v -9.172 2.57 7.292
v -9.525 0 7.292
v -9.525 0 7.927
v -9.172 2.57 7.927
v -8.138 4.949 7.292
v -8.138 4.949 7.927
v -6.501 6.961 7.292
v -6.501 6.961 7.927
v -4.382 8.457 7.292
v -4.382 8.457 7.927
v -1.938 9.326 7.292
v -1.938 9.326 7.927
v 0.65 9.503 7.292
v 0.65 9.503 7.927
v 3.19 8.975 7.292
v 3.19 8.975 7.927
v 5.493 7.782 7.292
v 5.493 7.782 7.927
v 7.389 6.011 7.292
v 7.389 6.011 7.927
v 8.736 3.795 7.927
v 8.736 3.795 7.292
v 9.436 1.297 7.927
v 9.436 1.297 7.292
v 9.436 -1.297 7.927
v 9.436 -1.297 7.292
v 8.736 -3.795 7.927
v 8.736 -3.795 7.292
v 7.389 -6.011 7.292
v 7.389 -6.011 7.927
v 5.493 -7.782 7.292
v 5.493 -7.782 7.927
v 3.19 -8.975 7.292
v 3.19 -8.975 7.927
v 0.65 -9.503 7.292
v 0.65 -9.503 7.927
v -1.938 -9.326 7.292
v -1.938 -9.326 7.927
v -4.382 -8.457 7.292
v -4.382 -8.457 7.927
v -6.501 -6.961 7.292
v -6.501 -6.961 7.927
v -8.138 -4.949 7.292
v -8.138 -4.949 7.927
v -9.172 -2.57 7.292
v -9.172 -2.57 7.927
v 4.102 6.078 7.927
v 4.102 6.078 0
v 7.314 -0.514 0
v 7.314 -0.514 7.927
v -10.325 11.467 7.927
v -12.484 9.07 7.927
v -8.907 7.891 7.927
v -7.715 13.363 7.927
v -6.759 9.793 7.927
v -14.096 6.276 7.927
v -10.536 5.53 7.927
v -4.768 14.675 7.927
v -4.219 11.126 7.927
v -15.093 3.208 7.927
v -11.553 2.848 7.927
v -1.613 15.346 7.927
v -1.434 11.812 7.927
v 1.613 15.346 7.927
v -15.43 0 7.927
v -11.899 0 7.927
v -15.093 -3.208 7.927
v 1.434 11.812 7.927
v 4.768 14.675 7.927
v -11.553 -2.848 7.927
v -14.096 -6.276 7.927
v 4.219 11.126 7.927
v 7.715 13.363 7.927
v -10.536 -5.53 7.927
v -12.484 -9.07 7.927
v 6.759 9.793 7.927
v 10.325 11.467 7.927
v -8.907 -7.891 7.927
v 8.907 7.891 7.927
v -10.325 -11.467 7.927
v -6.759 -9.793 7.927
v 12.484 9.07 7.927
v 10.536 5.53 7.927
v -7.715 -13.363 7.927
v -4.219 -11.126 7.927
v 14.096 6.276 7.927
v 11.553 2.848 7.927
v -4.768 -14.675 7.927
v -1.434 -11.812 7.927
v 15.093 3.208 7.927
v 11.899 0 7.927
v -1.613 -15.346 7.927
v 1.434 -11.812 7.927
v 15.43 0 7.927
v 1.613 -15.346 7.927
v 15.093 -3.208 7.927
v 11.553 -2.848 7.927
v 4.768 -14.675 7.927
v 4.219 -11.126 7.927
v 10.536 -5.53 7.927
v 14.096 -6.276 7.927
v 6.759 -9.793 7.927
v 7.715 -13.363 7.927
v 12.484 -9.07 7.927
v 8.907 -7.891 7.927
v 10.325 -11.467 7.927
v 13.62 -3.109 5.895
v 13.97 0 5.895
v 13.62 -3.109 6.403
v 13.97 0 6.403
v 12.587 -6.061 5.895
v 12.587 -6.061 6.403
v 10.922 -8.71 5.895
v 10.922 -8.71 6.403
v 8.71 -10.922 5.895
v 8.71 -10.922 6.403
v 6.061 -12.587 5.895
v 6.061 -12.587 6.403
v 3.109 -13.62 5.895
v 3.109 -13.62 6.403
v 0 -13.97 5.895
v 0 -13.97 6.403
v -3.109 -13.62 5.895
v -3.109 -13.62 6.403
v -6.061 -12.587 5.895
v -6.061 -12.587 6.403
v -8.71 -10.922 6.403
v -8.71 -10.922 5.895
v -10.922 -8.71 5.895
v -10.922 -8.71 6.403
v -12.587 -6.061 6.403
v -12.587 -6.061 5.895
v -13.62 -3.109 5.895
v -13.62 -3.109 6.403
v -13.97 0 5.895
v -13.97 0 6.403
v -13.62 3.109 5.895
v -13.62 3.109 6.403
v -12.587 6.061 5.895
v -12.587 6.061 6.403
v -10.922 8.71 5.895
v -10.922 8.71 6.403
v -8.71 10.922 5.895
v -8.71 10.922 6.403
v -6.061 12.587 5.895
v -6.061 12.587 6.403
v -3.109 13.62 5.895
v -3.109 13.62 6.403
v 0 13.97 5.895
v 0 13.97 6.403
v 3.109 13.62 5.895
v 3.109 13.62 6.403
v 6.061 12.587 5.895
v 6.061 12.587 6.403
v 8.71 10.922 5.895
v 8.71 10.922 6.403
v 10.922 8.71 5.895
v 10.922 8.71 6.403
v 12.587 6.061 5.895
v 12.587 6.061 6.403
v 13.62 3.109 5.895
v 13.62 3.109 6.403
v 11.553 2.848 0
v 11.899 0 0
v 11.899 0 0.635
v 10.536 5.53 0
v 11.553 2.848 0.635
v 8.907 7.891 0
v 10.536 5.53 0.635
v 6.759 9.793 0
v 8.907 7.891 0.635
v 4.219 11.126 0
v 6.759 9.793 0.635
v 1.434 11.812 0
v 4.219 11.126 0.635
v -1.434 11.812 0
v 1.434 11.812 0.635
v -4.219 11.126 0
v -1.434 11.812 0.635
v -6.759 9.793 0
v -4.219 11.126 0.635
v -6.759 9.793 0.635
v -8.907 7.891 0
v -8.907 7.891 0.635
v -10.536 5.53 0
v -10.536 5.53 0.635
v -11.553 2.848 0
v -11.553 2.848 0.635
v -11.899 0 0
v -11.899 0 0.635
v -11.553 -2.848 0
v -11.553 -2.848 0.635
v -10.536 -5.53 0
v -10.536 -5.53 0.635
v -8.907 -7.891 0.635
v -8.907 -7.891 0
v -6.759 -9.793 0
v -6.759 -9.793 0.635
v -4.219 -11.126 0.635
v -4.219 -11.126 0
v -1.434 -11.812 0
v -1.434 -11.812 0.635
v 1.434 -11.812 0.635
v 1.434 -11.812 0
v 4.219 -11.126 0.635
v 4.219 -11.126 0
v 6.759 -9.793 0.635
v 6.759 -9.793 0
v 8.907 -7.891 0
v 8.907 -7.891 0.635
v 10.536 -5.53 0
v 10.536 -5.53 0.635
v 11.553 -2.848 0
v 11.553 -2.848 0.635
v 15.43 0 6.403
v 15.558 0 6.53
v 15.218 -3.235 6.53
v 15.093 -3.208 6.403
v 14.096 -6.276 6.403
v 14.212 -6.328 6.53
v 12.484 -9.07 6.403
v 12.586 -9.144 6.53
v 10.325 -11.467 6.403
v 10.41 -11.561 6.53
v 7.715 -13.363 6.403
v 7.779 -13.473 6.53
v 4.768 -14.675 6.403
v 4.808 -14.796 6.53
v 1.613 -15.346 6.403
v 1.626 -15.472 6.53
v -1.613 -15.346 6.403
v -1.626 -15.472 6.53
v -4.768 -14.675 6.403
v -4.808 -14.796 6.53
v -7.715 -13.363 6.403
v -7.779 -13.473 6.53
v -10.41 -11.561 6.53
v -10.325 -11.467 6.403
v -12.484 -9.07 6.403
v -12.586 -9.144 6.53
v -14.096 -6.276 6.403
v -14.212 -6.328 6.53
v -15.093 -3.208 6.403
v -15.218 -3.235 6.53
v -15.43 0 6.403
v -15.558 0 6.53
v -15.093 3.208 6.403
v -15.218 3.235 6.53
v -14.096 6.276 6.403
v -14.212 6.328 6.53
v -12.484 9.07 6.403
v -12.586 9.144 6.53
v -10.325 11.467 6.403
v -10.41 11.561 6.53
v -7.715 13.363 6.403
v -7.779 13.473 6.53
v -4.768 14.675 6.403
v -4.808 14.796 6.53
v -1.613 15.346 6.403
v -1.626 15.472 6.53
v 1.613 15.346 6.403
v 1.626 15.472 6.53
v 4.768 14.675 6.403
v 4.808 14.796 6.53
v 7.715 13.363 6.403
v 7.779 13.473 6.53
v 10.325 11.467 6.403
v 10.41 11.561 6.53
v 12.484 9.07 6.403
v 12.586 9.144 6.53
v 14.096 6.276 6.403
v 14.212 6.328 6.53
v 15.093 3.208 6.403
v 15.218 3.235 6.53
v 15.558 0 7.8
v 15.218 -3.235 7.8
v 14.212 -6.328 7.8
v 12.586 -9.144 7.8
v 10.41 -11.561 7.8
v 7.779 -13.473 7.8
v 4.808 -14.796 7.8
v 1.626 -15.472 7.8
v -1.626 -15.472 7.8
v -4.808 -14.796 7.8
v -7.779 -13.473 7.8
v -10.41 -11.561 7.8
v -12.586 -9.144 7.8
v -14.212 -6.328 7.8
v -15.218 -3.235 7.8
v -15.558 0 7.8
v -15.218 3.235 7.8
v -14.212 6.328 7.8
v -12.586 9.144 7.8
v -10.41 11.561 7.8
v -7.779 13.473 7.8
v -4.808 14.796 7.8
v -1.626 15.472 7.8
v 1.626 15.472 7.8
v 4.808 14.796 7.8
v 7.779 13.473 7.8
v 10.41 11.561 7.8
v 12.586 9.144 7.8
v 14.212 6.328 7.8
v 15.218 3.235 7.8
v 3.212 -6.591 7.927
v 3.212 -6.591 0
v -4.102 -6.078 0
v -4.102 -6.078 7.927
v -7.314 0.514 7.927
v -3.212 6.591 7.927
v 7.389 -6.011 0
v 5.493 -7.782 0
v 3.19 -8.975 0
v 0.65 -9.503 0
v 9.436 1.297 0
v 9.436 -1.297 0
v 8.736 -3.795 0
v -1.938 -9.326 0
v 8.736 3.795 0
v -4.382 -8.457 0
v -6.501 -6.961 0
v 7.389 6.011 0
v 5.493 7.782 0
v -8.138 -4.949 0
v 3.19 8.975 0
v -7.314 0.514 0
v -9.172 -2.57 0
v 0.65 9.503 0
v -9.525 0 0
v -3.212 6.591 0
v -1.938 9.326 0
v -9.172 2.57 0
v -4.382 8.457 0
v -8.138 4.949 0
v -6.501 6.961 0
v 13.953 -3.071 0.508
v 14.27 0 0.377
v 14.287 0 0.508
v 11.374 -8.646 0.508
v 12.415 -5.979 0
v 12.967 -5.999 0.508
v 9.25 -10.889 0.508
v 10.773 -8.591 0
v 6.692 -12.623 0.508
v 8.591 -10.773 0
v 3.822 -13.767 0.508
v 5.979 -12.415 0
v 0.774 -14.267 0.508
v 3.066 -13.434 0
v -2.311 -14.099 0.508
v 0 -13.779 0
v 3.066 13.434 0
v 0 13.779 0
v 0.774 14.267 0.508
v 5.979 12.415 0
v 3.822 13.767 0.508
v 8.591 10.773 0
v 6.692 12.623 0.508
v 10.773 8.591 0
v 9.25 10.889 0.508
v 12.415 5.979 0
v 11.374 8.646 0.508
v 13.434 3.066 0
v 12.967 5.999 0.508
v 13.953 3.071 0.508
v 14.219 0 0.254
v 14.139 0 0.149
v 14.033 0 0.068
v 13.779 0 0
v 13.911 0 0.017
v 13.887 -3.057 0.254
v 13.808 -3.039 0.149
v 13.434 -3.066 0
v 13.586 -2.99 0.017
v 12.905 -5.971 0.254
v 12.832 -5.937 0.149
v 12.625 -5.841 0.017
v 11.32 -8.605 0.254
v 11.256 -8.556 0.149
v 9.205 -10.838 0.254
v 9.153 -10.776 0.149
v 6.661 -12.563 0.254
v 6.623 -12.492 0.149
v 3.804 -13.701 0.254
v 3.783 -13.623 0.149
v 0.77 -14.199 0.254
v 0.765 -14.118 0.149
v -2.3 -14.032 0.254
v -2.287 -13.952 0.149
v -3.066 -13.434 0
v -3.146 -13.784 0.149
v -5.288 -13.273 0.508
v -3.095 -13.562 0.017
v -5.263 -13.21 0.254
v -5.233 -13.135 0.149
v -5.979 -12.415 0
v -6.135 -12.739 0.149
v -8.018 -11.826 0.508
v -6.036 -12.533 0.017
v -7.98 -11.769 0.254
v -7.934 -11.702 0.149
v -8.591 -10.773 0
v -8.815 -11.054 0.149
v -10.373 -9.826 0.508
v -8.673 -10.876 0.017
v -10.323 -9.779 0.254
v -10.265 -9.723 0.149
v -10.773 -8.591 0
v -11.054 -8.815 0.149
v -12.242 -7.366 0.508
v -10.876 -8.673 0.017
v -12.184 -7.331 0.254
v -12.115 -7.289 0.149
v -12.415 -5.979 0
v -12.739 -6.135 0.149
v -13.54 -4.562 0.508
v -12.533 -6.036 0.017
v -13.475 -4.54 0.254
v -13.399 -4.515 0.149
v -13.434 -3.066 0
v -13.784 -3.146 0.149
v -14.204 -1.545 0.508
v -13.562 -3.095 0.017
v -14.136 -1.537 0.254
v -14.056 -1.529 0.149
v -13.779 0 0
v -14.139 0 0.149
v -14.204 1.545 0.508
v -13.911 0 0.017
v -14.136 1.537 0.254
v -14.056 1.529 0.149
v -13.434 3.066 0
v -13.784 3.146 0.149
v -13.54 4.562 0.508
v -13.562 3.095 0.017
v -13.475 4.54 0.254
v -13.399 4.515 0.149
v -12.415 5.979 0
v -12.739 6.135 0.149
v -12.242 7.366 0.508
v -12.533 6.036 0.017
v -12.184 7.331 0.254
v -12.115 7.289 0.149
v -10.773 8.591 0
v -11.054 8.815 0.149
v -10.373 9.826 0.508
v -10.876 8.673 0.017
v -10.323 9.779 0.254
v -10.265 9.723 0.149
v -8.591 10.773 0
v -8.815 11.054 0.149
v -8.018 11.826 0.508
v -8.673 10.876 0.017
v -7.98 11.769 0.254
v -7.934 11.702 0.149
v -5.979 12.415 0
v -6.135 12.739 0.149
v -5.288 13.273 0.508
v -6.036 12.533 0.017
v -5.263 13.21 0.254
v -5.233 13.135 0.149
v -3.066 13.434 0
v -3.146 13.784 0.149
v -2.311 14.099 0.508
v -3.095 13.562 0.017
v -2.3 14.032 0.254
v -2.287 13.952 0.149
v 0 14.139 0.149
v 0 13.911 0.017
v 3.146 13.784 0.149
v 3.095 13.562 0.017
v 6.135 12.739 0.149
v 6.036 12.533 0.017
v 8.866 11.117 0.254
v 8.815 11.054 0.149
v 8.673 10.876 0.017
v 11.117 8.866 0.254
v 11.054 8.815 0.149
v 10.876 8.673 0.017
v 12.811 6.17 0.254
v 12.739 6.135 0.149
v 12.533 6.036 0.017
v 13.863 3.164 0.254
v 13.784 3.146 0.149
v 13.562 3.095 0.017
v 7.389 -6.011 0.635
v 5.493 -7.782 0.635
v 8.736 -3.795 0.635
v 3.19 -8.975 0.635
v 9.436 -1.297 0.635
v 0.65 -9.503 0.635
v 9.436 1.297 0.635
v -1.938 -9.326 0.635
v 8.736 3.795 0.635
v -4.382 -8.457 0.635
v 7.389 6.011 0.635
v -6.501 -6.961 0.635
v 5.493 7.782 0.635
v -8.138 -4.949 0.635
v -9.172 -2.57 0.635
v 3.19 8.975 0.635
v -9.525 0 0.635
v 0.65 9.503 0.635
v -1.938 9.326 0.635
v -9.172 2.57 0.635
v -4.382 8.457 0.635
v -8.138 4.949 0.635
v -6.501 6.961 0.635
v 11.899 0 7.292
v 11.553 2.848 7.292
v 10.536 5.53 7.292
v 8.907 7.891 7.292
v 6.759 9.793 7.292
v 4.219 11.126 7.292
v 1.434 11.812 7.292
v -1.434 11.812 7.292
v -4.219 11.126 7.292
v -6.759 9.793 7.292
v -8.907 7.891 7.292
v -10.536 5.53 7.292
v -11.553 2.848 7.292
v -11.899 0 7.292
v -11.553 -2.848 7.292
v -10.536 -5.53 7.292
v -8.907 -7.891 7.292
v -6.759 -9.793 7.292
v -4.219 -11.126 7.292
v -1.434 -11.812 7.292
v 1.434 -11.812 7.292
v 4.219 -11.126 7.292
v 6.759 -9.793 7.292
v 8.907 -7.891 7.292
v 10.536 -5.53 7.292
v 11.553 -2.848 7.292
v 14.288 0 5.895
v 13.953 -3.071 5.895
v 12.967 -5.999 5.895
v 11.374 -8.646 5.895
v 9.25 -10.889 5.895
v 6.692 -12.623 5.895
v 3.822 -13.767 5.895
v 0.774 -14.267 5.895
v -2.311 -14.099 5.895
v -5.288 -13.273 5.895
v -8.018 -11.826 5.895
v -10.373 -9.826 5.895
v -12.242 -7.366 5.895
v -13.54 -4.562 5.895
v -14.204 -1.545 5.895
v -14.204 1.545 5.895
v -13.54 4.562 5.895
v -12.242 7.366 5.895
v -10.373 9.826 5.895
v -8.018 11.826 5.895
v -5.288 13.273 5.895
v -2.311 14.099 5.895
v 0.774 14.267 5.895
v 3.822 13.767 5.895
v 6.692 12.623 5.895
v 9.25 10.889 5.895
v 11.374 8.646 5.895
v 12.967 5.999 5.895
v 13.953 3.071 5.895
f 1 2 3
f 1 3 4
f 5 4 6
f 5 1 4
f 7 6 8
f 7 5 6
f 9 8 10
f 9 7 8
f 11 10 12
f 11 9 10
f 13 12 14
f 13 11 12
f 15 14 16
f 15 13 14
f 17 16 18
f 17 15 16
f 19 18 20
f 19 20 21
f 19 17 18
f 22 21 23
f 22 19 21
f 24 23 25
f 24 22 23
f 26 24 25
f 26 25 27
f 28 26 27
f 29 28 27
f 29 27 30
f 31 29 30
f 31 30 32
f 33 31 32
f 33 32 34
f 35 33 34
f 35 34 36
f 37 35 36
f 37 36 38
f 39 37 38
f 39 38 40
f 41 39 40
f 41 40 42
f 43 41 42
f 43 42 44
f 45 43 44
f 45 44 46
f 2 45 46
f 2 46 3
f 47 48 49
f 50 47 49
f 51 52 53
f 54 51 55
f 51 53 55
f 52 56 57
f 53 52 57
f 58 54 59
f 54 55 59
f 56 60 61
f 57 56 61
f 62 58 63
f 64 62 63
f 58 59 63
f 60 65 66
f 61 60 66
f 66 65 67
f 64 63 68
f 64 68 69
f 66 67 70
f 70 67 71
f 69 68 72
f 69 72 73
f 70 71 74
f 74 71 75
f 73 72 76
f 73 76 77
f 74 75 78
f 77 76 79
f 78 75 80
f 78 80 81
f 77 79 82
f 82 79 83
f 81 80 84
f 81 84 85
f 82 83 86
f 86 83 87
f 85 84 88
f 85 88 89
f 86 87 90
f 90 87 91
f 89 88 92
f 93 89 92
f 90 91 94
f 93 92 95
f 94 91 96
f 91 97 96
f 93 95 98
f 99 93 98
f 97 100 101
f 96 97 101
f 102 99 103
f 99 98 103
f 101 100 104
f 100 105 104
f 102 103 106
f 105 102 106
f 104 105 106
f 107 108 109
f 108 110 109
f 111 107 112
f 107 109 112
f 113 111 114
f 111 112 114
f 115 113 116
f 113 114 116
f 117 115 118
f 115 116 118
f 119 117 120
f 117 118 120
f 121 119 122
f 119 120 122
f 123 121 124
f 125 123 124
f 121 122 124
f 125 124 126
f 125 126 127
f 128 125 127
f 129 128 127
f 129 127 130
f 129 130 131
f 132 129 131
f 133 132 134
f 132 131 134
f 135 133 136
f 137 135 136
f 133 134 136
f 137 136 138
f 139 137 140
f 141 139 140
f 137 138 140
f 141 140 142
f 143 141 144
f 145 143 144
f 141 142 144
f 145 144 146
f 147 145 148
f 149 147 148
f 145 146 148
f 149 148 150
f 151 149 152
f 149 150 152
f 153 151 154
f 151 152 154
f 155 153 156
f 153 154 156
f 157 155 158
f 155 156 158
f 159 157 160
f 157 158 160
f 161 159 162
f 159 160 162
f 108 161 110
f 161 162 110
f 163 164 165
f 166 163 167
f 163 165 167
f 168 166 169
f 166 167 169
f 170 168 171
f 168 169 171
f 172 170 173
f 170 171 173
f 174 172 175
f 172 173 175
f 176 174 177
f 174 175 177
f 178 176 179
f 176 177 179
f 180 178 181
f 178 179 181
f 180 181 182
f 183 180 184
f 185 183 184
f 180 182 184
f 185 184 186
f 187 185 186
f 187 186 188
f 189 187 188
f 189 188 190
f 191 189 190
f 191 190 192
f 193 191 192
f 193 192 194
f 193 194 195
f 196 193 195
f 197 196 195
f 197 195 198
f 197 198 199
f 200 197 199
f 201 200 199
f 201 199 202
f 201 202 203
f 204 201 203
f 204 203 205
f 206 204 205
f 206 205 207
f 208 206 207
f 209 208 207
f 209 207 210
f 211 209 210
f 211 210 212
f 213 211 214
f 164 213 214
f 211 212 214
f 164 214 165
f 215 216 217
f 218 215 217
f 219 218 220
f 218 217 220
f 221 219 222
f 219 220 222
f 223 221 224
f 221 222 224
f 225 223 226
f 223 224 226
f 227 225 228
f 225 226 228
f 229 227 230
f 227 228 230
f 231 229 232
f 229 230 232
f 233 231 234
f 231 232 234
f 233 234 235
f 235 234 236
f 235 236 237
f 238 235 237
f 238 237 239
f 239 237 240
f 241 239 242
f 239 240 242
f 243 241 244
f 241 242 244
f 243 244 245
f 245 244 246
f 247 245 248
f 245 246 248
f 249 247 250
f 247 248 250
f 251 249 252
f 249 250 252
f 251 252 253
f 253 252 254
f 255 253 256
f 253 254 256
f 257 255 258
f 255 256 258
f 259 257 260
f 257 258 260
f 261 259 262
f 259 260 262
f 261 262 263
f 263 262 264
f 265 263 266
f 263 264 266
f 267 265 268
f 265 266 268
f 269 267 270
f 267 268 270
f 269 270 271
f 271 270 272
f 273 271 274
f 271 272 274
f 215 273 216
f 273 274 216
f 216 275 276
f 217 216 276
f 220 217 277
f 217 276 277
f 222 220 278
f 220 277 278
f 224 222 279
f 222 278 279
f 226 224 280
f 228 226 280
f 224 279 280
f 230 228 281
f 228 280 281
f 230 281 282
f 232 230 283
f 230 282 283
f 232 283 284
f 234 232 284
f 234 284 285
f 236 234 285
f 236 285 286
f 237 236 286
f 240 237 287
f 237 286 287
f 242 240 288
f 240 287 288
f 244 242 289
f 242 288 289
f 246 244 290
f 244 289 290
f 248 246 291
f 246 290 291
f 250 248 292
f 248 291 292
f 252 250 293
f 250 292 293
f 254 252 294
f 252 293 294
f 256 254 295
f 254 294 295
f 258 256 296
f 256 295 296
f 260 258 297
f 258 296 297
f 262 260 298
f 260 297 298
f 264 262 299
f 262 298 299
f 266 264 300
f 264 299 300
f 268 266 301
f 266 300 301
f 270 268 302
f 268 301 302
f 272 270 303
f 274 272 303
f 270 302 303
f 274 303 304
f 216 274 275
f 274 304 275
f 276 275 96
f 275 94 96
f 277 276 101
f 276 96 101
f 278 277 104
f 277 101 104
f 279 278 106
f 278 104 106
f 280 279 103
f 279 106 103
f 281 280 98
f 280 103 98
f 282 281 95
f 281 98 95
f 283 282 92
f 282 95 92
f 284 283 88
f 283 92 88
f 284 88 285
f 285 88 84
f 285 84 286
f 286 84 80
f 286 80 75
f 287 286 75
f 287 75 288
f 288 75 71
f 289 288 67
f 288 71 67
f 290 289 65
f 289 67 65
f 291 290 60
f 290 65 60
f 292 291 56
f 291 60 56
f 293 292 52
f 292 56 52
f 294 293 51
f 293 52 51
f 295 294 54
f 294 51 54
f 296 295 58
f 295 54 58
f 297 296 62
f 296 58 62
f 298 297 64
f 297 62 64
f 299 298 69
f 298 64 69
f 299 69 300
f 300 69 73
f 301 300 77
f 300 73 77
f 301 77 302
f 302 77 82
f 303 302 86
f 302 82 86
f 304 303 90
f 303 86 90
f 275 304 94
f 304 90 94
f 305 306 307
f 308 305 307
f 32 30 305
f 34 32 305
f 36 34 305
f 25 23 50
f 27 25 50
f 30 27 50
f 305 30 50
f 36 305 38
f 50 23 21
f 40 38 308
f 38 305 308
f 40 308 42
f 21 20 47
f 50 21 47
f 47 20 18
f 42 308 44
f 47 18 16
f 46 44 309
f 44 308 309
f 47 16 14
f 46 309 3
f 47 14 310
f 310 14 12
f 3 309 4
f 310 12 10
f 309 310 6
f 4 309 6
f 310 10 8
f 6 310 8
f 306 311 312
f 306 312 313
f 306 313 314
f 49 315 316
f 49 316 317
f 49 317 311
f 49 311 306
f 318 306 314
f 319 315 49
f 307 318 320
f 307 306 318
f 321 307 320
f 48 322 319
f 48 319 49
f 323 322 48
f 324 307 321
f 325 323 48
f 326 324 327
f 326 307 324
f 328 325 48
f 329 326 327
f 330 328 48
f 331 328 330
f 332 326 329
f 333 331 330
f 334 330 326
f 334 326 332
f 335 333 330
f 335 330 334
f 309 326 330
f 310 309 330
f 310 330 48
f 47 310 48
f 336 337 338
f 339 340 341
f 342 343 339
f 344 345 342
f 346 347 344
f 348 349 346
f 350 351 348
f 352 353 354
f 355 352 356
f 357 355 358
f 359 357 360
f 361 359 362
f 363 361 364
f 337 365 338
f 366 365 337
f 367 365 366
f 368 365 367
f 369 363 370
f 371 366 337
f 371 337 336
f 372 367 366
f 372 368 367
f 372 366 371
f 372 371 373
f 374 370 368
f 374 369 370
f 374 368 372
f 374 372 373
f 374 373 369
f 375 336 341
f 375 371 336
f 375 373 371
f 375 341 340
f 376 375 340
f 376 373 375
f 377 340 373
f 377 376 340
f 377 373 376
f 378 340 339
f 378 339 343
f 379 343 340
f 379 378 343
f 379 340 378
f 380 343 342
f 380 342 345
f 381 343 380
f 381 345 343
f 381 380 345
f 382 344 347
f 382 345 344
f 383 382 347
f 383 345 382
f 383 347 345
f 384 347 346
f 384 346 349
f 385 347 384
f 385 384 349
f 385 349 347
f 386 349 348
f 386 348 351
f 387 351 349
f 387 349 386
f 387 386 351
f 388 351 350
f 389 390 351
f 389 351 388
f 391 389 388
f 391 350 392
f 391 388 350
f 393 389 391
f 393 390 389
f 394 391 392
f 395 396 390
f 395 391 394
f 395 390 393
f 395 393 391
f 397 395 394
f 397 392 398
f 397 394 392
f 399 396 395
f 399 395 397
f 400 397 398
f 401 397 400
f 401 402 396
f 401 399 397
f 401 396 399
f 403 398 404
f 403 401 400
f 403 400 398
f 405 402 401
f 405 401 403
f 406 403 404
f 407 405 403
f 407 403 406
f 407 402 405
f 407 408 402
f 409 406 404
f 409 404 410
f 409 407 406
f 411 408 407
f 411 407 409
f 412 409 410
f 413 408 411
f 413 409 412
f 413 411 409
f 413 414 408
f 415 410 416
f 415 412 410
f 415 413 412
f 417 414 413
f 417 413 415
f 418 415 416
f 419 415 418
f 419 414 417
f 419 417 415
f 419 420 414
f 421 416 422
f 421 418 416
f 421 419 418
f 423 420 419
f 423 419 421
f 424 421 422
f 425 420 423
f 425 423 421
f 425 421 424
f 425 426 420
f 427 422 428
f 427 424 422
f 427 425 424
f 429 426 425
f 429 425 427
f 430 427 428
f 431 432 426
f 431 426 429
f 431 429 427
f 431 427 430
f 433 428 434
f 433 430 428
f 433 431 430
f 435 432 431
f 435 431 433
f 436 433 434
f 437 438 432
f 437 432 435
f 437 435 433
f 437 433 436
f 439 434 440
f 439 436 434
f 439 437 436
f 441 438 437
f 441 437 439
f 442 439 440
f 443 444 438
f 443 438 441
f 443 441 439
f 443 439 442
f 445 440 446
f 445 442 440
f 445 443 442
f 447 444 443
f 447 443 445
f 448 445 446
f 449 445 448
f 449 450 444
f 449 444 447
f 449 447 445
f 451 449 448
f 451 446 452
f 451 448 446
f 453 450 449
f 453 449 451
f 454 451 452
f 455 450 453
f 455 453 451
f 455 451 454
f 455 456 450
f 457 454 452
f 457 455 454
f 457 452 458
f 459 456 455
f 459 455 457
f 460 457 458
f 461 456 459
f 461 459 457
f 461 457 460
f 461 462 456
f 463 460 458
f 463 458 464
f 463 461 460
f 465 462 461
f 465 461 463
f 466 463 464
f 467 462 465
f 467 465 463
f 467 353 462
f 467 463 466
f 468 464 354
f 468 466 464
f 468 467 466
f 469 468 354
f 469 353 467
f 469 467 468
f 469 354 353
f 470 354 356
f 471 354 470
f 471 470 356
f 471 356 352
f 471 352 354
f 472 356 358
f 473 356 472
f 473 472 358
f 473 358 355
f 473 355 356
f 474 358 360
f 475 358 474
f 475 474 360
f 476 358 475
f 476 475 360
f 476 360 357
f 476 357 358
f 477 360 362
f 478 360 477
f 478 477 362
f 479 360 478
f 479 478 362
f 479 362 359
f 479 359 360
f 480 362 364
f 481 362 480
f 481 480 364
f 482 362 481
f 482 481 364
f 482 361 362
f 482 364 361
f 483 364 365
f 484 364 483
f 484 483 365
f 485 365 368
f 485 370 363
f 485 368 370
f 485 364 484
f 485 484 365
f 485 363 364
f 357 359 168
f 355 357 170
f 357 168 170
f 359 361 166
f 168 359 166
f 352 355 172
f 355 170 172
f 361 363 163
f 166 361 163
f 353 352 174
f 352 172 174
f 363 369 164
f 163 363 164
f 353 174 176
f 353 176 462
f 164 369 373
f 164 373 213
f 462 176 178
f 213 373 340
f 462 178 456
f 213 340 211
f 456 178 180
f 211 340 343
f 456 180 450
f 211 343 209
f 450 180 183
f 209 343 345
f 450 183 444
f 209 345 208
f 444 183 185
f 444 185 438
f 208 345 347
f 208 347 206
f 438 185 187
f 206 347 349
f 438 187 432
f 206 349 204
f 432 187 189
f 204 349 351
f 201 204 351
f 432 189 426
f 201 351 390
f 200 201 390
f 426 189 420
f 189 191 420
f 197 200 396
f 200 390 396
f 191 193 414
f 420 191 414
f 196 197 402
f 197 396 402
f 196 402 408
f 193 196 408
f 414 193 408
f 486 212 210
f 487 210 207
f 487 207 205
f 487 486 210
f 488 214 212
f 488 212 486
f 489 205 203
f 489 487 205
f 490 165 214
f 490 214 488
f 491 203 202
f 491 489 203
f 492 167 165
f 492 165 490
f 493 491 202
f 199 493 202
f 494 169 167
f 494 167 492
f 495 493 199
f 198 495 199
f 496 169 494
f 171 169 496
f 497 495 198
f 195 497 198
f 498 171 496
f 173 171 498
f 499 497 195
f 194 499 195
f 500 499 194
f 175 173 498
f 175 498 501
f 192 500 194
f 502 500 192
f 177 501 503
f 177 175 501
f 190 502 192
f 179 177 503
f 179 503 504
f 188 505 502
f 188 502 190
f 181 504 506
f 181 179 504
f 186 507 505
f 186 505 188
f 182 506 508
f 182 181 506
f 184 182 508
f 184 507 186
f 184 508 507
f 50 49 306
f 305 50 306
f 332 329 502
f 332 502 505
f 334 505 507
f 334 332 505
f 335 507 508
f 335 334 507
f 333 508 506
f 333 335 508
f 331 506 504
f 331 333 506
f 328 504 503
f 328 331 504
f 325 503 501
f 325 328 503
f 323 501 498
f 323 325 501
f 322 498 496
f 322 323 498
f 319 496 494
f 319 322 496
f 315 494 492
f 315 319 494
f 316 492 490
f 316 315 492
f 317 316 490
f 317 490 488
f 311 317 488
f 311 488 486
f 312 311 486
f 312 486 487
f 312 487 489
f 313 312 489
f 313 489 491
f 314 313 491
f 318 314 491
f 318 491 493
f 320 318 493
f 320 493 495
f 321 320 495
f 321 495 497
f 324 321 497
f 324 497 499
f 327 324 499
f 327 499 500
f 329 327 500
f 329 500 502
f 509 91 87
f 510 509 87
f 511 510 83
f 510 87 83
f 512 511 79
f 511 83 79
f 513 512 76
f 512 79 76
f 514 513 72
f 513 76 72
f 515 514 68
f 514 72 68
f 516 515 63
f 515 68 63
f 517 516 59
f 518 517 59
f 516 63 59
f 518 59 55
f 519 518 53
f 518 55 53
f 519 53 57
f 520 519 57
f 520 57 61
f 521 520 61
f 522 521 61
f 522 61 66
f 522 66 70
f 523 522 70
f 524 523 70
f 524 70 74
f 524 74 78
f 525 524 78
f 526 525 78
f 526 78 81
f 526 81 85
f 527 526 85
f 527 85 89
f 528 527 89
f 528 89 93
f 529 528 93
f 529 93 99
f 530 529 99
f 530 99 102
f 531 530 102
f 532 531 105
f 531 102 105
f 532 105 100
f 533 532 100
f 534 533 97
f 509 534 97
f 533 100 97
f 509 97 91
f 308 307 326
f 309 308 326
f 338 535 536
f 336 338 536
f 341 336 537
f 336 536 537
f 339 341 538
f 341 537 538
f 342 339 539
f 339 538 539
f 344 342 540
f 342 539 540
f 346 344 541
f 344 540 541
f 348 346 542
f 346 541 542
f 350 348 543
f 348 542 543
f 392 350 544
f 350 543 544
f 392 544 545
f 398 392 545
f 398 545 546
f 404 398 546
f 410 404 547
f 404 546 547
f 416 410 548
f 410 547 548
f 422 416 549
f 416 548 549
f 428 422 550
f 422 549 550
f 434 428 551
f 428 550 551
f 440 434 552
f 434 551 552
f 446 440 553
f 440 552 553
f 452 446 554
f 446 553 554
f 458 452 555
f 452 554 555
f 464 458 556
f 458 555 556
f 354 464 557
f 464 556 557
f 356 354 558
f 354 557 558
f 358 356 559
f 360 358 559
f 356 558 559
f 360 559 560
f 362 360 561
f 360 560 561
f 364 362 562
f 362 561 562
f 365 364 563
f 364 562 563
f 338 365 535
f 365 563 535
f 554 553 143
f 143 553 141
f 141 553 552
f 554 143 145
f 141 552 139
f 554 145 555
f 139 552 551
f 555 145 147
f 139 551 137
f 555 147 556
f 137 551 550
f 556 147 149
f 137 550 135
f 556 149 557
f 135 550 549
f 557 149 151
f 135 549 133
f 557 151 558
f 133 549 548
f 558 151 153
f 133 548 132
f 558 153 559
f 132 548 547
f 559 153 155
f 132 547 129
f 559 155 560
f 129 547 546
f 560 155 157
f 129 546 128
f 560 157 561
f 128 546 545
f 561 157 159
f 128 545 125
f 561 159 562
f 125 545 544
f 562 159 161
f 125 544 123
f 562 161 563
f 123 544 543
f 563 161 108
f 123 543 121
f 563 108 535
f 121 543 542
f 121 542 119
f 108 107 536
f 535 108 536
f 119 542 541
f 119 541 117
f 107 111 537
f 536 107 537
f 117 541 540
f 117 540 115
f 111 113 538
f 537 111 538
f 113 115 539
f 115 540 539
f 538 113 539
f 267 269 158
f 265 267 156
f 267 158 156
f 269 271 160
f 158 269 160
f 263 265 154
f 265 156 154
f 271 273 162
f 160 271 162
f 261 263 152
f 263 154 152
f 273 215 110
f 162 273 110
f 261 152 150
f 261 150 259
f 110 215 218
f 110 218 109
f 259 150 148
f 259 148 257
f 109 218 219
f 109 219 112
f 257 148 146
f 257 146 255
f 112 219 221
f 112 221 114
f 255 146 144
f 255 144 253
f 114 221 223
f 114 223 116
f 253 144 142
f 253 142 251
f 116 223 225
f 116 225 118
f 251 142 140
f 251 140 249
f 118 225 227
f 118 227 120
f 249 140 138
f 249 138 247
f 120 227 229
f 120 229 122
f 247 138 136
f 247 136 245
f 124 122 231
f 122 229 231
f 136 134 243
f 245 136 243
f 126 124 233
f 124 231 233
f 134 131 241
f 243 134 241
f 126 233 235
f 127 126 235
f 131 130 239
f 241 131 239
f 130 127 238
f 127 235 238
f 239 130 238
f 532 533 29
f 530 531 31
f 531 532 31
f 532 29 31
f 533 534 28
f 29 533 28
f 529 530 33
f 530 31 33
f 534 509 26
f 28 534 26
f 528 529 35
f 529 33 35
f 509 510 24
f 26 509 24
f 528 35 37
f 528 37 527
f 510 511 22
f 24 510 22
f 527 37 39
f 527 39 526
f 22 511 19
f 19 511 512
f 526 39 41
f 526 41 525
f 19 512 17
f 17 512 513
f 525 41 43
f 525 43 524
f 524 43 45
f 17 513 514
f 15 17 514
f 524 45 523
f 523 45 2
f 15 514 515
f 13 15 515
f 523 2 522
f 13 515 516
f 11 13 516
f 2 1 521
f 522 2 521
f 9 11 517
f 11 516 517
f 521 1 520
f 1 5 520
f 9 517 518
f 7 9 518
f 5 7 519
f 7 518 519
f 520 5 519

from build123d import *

# Parameters (mm, degrees)
CHAMFER1_SIZE       = 0.127
FILLET2_R           = 0.508
CUT_EXTRUDE2_REACH  = 9.927
SKETCH3_R           = 11.899111158
SKETCH4_R           = 9.525
BOSS_EXTRUDE1_DEPTH = 7.92734
SKETCH5_R           = 11.899111158
SKETCH5_R_2         = 9.525
BOSS_EXTRUDE2_DEPTH = 6.65734


with BuildPart() as part:
    # Sketch1 → Revolve1 (revolve)
    with BuildSketch(Plane.XZ):
        Polygon((15.4305, 7.92734), (0, 7.92734), (0, 0), (14.2875, 0), (14.2875, 5.89534), (13.97, 5.89534), (13.97, 6.40334), (15.5575, 6.40334), (15.5575, 7.80034), align=None)
    revolve(axis=Axis((0, 0, 7.92734), (0, 0, -1)))

    # Chamfer1
    chamfer1_edges = [part.edges().sort_by_distance(p)[0] for p in [
        (-15.5575, 0, 6.40334),
    ]]
    chamfer(chamfer1_edges, length=CHAMFER1_SIZE)

    # Fillet2
    fillet2_edges = [part.edges().sort_by_distance(p)[0] for p in [
        (-14.2875, 0, 0),
    ]]
    fillet(fillet2_edges, radius=FILLET2_R)

    # Sketch3 → Cut-Extrude2 (cut, up to next)
    with BuildSketch(Plane.XY.offset(7.92734), mode=Mode.PRIVATE) as cut_extrude2_sk1:
        Circle(SKETCH3_R)
    cut_extrude2_tool1 = extrude(cut_extrude2_sk1.sketch, amount=-CUT_EXTRUDE2_REACH, mode=Mode.PRIVATE) & part.part
    add(cut_extrude2_tool1.solids().sort_by_distance((0, 0, 7.92734))[0], mode=Mode.SUBTRACT)



with BuildPart() as body_2:
    # Sketch4 → Boss-Extrude1 (new body)
    with BuildSketch(Plane(origin=(0, 0, 0), x_dir=(-1, 0, 0), z_dir=(0, 0, -1))):
        Circle(SKETCH4_R)
        Polygon((-3.212275886, -6.591253065), (4.102054654, -6.077539054), (7.31433054, 0.513714011), (3.212275886, 6.591253065), (-4.102054654, 6.077539054), (-7.31433054, -0.513714011), align=None, mode=Mode.SUBTRACT)
    extrude(amount=-BOSS_EXTRUDE1_DEPTH)


with BuildPart() as part_1:
    add(part.part)

    add(body_2.part)  # Boss-Extrude2 merges body 2
    # Sketch5 → Boss-Extrude2 (add)
    with BuildSketch(Plane(origin=(0, 0, 0.635), x_dir=(-1, 0, 0), z_dir=(0, 0, -1))):
        Circle(SKETCH5_R)
        Circle(SKETCH5_R_2, mode=Mode.SUBTRACT)
    extrude(amount=-BOSS_EXTRUDE2_DEPTH)


solid = part_1.part
